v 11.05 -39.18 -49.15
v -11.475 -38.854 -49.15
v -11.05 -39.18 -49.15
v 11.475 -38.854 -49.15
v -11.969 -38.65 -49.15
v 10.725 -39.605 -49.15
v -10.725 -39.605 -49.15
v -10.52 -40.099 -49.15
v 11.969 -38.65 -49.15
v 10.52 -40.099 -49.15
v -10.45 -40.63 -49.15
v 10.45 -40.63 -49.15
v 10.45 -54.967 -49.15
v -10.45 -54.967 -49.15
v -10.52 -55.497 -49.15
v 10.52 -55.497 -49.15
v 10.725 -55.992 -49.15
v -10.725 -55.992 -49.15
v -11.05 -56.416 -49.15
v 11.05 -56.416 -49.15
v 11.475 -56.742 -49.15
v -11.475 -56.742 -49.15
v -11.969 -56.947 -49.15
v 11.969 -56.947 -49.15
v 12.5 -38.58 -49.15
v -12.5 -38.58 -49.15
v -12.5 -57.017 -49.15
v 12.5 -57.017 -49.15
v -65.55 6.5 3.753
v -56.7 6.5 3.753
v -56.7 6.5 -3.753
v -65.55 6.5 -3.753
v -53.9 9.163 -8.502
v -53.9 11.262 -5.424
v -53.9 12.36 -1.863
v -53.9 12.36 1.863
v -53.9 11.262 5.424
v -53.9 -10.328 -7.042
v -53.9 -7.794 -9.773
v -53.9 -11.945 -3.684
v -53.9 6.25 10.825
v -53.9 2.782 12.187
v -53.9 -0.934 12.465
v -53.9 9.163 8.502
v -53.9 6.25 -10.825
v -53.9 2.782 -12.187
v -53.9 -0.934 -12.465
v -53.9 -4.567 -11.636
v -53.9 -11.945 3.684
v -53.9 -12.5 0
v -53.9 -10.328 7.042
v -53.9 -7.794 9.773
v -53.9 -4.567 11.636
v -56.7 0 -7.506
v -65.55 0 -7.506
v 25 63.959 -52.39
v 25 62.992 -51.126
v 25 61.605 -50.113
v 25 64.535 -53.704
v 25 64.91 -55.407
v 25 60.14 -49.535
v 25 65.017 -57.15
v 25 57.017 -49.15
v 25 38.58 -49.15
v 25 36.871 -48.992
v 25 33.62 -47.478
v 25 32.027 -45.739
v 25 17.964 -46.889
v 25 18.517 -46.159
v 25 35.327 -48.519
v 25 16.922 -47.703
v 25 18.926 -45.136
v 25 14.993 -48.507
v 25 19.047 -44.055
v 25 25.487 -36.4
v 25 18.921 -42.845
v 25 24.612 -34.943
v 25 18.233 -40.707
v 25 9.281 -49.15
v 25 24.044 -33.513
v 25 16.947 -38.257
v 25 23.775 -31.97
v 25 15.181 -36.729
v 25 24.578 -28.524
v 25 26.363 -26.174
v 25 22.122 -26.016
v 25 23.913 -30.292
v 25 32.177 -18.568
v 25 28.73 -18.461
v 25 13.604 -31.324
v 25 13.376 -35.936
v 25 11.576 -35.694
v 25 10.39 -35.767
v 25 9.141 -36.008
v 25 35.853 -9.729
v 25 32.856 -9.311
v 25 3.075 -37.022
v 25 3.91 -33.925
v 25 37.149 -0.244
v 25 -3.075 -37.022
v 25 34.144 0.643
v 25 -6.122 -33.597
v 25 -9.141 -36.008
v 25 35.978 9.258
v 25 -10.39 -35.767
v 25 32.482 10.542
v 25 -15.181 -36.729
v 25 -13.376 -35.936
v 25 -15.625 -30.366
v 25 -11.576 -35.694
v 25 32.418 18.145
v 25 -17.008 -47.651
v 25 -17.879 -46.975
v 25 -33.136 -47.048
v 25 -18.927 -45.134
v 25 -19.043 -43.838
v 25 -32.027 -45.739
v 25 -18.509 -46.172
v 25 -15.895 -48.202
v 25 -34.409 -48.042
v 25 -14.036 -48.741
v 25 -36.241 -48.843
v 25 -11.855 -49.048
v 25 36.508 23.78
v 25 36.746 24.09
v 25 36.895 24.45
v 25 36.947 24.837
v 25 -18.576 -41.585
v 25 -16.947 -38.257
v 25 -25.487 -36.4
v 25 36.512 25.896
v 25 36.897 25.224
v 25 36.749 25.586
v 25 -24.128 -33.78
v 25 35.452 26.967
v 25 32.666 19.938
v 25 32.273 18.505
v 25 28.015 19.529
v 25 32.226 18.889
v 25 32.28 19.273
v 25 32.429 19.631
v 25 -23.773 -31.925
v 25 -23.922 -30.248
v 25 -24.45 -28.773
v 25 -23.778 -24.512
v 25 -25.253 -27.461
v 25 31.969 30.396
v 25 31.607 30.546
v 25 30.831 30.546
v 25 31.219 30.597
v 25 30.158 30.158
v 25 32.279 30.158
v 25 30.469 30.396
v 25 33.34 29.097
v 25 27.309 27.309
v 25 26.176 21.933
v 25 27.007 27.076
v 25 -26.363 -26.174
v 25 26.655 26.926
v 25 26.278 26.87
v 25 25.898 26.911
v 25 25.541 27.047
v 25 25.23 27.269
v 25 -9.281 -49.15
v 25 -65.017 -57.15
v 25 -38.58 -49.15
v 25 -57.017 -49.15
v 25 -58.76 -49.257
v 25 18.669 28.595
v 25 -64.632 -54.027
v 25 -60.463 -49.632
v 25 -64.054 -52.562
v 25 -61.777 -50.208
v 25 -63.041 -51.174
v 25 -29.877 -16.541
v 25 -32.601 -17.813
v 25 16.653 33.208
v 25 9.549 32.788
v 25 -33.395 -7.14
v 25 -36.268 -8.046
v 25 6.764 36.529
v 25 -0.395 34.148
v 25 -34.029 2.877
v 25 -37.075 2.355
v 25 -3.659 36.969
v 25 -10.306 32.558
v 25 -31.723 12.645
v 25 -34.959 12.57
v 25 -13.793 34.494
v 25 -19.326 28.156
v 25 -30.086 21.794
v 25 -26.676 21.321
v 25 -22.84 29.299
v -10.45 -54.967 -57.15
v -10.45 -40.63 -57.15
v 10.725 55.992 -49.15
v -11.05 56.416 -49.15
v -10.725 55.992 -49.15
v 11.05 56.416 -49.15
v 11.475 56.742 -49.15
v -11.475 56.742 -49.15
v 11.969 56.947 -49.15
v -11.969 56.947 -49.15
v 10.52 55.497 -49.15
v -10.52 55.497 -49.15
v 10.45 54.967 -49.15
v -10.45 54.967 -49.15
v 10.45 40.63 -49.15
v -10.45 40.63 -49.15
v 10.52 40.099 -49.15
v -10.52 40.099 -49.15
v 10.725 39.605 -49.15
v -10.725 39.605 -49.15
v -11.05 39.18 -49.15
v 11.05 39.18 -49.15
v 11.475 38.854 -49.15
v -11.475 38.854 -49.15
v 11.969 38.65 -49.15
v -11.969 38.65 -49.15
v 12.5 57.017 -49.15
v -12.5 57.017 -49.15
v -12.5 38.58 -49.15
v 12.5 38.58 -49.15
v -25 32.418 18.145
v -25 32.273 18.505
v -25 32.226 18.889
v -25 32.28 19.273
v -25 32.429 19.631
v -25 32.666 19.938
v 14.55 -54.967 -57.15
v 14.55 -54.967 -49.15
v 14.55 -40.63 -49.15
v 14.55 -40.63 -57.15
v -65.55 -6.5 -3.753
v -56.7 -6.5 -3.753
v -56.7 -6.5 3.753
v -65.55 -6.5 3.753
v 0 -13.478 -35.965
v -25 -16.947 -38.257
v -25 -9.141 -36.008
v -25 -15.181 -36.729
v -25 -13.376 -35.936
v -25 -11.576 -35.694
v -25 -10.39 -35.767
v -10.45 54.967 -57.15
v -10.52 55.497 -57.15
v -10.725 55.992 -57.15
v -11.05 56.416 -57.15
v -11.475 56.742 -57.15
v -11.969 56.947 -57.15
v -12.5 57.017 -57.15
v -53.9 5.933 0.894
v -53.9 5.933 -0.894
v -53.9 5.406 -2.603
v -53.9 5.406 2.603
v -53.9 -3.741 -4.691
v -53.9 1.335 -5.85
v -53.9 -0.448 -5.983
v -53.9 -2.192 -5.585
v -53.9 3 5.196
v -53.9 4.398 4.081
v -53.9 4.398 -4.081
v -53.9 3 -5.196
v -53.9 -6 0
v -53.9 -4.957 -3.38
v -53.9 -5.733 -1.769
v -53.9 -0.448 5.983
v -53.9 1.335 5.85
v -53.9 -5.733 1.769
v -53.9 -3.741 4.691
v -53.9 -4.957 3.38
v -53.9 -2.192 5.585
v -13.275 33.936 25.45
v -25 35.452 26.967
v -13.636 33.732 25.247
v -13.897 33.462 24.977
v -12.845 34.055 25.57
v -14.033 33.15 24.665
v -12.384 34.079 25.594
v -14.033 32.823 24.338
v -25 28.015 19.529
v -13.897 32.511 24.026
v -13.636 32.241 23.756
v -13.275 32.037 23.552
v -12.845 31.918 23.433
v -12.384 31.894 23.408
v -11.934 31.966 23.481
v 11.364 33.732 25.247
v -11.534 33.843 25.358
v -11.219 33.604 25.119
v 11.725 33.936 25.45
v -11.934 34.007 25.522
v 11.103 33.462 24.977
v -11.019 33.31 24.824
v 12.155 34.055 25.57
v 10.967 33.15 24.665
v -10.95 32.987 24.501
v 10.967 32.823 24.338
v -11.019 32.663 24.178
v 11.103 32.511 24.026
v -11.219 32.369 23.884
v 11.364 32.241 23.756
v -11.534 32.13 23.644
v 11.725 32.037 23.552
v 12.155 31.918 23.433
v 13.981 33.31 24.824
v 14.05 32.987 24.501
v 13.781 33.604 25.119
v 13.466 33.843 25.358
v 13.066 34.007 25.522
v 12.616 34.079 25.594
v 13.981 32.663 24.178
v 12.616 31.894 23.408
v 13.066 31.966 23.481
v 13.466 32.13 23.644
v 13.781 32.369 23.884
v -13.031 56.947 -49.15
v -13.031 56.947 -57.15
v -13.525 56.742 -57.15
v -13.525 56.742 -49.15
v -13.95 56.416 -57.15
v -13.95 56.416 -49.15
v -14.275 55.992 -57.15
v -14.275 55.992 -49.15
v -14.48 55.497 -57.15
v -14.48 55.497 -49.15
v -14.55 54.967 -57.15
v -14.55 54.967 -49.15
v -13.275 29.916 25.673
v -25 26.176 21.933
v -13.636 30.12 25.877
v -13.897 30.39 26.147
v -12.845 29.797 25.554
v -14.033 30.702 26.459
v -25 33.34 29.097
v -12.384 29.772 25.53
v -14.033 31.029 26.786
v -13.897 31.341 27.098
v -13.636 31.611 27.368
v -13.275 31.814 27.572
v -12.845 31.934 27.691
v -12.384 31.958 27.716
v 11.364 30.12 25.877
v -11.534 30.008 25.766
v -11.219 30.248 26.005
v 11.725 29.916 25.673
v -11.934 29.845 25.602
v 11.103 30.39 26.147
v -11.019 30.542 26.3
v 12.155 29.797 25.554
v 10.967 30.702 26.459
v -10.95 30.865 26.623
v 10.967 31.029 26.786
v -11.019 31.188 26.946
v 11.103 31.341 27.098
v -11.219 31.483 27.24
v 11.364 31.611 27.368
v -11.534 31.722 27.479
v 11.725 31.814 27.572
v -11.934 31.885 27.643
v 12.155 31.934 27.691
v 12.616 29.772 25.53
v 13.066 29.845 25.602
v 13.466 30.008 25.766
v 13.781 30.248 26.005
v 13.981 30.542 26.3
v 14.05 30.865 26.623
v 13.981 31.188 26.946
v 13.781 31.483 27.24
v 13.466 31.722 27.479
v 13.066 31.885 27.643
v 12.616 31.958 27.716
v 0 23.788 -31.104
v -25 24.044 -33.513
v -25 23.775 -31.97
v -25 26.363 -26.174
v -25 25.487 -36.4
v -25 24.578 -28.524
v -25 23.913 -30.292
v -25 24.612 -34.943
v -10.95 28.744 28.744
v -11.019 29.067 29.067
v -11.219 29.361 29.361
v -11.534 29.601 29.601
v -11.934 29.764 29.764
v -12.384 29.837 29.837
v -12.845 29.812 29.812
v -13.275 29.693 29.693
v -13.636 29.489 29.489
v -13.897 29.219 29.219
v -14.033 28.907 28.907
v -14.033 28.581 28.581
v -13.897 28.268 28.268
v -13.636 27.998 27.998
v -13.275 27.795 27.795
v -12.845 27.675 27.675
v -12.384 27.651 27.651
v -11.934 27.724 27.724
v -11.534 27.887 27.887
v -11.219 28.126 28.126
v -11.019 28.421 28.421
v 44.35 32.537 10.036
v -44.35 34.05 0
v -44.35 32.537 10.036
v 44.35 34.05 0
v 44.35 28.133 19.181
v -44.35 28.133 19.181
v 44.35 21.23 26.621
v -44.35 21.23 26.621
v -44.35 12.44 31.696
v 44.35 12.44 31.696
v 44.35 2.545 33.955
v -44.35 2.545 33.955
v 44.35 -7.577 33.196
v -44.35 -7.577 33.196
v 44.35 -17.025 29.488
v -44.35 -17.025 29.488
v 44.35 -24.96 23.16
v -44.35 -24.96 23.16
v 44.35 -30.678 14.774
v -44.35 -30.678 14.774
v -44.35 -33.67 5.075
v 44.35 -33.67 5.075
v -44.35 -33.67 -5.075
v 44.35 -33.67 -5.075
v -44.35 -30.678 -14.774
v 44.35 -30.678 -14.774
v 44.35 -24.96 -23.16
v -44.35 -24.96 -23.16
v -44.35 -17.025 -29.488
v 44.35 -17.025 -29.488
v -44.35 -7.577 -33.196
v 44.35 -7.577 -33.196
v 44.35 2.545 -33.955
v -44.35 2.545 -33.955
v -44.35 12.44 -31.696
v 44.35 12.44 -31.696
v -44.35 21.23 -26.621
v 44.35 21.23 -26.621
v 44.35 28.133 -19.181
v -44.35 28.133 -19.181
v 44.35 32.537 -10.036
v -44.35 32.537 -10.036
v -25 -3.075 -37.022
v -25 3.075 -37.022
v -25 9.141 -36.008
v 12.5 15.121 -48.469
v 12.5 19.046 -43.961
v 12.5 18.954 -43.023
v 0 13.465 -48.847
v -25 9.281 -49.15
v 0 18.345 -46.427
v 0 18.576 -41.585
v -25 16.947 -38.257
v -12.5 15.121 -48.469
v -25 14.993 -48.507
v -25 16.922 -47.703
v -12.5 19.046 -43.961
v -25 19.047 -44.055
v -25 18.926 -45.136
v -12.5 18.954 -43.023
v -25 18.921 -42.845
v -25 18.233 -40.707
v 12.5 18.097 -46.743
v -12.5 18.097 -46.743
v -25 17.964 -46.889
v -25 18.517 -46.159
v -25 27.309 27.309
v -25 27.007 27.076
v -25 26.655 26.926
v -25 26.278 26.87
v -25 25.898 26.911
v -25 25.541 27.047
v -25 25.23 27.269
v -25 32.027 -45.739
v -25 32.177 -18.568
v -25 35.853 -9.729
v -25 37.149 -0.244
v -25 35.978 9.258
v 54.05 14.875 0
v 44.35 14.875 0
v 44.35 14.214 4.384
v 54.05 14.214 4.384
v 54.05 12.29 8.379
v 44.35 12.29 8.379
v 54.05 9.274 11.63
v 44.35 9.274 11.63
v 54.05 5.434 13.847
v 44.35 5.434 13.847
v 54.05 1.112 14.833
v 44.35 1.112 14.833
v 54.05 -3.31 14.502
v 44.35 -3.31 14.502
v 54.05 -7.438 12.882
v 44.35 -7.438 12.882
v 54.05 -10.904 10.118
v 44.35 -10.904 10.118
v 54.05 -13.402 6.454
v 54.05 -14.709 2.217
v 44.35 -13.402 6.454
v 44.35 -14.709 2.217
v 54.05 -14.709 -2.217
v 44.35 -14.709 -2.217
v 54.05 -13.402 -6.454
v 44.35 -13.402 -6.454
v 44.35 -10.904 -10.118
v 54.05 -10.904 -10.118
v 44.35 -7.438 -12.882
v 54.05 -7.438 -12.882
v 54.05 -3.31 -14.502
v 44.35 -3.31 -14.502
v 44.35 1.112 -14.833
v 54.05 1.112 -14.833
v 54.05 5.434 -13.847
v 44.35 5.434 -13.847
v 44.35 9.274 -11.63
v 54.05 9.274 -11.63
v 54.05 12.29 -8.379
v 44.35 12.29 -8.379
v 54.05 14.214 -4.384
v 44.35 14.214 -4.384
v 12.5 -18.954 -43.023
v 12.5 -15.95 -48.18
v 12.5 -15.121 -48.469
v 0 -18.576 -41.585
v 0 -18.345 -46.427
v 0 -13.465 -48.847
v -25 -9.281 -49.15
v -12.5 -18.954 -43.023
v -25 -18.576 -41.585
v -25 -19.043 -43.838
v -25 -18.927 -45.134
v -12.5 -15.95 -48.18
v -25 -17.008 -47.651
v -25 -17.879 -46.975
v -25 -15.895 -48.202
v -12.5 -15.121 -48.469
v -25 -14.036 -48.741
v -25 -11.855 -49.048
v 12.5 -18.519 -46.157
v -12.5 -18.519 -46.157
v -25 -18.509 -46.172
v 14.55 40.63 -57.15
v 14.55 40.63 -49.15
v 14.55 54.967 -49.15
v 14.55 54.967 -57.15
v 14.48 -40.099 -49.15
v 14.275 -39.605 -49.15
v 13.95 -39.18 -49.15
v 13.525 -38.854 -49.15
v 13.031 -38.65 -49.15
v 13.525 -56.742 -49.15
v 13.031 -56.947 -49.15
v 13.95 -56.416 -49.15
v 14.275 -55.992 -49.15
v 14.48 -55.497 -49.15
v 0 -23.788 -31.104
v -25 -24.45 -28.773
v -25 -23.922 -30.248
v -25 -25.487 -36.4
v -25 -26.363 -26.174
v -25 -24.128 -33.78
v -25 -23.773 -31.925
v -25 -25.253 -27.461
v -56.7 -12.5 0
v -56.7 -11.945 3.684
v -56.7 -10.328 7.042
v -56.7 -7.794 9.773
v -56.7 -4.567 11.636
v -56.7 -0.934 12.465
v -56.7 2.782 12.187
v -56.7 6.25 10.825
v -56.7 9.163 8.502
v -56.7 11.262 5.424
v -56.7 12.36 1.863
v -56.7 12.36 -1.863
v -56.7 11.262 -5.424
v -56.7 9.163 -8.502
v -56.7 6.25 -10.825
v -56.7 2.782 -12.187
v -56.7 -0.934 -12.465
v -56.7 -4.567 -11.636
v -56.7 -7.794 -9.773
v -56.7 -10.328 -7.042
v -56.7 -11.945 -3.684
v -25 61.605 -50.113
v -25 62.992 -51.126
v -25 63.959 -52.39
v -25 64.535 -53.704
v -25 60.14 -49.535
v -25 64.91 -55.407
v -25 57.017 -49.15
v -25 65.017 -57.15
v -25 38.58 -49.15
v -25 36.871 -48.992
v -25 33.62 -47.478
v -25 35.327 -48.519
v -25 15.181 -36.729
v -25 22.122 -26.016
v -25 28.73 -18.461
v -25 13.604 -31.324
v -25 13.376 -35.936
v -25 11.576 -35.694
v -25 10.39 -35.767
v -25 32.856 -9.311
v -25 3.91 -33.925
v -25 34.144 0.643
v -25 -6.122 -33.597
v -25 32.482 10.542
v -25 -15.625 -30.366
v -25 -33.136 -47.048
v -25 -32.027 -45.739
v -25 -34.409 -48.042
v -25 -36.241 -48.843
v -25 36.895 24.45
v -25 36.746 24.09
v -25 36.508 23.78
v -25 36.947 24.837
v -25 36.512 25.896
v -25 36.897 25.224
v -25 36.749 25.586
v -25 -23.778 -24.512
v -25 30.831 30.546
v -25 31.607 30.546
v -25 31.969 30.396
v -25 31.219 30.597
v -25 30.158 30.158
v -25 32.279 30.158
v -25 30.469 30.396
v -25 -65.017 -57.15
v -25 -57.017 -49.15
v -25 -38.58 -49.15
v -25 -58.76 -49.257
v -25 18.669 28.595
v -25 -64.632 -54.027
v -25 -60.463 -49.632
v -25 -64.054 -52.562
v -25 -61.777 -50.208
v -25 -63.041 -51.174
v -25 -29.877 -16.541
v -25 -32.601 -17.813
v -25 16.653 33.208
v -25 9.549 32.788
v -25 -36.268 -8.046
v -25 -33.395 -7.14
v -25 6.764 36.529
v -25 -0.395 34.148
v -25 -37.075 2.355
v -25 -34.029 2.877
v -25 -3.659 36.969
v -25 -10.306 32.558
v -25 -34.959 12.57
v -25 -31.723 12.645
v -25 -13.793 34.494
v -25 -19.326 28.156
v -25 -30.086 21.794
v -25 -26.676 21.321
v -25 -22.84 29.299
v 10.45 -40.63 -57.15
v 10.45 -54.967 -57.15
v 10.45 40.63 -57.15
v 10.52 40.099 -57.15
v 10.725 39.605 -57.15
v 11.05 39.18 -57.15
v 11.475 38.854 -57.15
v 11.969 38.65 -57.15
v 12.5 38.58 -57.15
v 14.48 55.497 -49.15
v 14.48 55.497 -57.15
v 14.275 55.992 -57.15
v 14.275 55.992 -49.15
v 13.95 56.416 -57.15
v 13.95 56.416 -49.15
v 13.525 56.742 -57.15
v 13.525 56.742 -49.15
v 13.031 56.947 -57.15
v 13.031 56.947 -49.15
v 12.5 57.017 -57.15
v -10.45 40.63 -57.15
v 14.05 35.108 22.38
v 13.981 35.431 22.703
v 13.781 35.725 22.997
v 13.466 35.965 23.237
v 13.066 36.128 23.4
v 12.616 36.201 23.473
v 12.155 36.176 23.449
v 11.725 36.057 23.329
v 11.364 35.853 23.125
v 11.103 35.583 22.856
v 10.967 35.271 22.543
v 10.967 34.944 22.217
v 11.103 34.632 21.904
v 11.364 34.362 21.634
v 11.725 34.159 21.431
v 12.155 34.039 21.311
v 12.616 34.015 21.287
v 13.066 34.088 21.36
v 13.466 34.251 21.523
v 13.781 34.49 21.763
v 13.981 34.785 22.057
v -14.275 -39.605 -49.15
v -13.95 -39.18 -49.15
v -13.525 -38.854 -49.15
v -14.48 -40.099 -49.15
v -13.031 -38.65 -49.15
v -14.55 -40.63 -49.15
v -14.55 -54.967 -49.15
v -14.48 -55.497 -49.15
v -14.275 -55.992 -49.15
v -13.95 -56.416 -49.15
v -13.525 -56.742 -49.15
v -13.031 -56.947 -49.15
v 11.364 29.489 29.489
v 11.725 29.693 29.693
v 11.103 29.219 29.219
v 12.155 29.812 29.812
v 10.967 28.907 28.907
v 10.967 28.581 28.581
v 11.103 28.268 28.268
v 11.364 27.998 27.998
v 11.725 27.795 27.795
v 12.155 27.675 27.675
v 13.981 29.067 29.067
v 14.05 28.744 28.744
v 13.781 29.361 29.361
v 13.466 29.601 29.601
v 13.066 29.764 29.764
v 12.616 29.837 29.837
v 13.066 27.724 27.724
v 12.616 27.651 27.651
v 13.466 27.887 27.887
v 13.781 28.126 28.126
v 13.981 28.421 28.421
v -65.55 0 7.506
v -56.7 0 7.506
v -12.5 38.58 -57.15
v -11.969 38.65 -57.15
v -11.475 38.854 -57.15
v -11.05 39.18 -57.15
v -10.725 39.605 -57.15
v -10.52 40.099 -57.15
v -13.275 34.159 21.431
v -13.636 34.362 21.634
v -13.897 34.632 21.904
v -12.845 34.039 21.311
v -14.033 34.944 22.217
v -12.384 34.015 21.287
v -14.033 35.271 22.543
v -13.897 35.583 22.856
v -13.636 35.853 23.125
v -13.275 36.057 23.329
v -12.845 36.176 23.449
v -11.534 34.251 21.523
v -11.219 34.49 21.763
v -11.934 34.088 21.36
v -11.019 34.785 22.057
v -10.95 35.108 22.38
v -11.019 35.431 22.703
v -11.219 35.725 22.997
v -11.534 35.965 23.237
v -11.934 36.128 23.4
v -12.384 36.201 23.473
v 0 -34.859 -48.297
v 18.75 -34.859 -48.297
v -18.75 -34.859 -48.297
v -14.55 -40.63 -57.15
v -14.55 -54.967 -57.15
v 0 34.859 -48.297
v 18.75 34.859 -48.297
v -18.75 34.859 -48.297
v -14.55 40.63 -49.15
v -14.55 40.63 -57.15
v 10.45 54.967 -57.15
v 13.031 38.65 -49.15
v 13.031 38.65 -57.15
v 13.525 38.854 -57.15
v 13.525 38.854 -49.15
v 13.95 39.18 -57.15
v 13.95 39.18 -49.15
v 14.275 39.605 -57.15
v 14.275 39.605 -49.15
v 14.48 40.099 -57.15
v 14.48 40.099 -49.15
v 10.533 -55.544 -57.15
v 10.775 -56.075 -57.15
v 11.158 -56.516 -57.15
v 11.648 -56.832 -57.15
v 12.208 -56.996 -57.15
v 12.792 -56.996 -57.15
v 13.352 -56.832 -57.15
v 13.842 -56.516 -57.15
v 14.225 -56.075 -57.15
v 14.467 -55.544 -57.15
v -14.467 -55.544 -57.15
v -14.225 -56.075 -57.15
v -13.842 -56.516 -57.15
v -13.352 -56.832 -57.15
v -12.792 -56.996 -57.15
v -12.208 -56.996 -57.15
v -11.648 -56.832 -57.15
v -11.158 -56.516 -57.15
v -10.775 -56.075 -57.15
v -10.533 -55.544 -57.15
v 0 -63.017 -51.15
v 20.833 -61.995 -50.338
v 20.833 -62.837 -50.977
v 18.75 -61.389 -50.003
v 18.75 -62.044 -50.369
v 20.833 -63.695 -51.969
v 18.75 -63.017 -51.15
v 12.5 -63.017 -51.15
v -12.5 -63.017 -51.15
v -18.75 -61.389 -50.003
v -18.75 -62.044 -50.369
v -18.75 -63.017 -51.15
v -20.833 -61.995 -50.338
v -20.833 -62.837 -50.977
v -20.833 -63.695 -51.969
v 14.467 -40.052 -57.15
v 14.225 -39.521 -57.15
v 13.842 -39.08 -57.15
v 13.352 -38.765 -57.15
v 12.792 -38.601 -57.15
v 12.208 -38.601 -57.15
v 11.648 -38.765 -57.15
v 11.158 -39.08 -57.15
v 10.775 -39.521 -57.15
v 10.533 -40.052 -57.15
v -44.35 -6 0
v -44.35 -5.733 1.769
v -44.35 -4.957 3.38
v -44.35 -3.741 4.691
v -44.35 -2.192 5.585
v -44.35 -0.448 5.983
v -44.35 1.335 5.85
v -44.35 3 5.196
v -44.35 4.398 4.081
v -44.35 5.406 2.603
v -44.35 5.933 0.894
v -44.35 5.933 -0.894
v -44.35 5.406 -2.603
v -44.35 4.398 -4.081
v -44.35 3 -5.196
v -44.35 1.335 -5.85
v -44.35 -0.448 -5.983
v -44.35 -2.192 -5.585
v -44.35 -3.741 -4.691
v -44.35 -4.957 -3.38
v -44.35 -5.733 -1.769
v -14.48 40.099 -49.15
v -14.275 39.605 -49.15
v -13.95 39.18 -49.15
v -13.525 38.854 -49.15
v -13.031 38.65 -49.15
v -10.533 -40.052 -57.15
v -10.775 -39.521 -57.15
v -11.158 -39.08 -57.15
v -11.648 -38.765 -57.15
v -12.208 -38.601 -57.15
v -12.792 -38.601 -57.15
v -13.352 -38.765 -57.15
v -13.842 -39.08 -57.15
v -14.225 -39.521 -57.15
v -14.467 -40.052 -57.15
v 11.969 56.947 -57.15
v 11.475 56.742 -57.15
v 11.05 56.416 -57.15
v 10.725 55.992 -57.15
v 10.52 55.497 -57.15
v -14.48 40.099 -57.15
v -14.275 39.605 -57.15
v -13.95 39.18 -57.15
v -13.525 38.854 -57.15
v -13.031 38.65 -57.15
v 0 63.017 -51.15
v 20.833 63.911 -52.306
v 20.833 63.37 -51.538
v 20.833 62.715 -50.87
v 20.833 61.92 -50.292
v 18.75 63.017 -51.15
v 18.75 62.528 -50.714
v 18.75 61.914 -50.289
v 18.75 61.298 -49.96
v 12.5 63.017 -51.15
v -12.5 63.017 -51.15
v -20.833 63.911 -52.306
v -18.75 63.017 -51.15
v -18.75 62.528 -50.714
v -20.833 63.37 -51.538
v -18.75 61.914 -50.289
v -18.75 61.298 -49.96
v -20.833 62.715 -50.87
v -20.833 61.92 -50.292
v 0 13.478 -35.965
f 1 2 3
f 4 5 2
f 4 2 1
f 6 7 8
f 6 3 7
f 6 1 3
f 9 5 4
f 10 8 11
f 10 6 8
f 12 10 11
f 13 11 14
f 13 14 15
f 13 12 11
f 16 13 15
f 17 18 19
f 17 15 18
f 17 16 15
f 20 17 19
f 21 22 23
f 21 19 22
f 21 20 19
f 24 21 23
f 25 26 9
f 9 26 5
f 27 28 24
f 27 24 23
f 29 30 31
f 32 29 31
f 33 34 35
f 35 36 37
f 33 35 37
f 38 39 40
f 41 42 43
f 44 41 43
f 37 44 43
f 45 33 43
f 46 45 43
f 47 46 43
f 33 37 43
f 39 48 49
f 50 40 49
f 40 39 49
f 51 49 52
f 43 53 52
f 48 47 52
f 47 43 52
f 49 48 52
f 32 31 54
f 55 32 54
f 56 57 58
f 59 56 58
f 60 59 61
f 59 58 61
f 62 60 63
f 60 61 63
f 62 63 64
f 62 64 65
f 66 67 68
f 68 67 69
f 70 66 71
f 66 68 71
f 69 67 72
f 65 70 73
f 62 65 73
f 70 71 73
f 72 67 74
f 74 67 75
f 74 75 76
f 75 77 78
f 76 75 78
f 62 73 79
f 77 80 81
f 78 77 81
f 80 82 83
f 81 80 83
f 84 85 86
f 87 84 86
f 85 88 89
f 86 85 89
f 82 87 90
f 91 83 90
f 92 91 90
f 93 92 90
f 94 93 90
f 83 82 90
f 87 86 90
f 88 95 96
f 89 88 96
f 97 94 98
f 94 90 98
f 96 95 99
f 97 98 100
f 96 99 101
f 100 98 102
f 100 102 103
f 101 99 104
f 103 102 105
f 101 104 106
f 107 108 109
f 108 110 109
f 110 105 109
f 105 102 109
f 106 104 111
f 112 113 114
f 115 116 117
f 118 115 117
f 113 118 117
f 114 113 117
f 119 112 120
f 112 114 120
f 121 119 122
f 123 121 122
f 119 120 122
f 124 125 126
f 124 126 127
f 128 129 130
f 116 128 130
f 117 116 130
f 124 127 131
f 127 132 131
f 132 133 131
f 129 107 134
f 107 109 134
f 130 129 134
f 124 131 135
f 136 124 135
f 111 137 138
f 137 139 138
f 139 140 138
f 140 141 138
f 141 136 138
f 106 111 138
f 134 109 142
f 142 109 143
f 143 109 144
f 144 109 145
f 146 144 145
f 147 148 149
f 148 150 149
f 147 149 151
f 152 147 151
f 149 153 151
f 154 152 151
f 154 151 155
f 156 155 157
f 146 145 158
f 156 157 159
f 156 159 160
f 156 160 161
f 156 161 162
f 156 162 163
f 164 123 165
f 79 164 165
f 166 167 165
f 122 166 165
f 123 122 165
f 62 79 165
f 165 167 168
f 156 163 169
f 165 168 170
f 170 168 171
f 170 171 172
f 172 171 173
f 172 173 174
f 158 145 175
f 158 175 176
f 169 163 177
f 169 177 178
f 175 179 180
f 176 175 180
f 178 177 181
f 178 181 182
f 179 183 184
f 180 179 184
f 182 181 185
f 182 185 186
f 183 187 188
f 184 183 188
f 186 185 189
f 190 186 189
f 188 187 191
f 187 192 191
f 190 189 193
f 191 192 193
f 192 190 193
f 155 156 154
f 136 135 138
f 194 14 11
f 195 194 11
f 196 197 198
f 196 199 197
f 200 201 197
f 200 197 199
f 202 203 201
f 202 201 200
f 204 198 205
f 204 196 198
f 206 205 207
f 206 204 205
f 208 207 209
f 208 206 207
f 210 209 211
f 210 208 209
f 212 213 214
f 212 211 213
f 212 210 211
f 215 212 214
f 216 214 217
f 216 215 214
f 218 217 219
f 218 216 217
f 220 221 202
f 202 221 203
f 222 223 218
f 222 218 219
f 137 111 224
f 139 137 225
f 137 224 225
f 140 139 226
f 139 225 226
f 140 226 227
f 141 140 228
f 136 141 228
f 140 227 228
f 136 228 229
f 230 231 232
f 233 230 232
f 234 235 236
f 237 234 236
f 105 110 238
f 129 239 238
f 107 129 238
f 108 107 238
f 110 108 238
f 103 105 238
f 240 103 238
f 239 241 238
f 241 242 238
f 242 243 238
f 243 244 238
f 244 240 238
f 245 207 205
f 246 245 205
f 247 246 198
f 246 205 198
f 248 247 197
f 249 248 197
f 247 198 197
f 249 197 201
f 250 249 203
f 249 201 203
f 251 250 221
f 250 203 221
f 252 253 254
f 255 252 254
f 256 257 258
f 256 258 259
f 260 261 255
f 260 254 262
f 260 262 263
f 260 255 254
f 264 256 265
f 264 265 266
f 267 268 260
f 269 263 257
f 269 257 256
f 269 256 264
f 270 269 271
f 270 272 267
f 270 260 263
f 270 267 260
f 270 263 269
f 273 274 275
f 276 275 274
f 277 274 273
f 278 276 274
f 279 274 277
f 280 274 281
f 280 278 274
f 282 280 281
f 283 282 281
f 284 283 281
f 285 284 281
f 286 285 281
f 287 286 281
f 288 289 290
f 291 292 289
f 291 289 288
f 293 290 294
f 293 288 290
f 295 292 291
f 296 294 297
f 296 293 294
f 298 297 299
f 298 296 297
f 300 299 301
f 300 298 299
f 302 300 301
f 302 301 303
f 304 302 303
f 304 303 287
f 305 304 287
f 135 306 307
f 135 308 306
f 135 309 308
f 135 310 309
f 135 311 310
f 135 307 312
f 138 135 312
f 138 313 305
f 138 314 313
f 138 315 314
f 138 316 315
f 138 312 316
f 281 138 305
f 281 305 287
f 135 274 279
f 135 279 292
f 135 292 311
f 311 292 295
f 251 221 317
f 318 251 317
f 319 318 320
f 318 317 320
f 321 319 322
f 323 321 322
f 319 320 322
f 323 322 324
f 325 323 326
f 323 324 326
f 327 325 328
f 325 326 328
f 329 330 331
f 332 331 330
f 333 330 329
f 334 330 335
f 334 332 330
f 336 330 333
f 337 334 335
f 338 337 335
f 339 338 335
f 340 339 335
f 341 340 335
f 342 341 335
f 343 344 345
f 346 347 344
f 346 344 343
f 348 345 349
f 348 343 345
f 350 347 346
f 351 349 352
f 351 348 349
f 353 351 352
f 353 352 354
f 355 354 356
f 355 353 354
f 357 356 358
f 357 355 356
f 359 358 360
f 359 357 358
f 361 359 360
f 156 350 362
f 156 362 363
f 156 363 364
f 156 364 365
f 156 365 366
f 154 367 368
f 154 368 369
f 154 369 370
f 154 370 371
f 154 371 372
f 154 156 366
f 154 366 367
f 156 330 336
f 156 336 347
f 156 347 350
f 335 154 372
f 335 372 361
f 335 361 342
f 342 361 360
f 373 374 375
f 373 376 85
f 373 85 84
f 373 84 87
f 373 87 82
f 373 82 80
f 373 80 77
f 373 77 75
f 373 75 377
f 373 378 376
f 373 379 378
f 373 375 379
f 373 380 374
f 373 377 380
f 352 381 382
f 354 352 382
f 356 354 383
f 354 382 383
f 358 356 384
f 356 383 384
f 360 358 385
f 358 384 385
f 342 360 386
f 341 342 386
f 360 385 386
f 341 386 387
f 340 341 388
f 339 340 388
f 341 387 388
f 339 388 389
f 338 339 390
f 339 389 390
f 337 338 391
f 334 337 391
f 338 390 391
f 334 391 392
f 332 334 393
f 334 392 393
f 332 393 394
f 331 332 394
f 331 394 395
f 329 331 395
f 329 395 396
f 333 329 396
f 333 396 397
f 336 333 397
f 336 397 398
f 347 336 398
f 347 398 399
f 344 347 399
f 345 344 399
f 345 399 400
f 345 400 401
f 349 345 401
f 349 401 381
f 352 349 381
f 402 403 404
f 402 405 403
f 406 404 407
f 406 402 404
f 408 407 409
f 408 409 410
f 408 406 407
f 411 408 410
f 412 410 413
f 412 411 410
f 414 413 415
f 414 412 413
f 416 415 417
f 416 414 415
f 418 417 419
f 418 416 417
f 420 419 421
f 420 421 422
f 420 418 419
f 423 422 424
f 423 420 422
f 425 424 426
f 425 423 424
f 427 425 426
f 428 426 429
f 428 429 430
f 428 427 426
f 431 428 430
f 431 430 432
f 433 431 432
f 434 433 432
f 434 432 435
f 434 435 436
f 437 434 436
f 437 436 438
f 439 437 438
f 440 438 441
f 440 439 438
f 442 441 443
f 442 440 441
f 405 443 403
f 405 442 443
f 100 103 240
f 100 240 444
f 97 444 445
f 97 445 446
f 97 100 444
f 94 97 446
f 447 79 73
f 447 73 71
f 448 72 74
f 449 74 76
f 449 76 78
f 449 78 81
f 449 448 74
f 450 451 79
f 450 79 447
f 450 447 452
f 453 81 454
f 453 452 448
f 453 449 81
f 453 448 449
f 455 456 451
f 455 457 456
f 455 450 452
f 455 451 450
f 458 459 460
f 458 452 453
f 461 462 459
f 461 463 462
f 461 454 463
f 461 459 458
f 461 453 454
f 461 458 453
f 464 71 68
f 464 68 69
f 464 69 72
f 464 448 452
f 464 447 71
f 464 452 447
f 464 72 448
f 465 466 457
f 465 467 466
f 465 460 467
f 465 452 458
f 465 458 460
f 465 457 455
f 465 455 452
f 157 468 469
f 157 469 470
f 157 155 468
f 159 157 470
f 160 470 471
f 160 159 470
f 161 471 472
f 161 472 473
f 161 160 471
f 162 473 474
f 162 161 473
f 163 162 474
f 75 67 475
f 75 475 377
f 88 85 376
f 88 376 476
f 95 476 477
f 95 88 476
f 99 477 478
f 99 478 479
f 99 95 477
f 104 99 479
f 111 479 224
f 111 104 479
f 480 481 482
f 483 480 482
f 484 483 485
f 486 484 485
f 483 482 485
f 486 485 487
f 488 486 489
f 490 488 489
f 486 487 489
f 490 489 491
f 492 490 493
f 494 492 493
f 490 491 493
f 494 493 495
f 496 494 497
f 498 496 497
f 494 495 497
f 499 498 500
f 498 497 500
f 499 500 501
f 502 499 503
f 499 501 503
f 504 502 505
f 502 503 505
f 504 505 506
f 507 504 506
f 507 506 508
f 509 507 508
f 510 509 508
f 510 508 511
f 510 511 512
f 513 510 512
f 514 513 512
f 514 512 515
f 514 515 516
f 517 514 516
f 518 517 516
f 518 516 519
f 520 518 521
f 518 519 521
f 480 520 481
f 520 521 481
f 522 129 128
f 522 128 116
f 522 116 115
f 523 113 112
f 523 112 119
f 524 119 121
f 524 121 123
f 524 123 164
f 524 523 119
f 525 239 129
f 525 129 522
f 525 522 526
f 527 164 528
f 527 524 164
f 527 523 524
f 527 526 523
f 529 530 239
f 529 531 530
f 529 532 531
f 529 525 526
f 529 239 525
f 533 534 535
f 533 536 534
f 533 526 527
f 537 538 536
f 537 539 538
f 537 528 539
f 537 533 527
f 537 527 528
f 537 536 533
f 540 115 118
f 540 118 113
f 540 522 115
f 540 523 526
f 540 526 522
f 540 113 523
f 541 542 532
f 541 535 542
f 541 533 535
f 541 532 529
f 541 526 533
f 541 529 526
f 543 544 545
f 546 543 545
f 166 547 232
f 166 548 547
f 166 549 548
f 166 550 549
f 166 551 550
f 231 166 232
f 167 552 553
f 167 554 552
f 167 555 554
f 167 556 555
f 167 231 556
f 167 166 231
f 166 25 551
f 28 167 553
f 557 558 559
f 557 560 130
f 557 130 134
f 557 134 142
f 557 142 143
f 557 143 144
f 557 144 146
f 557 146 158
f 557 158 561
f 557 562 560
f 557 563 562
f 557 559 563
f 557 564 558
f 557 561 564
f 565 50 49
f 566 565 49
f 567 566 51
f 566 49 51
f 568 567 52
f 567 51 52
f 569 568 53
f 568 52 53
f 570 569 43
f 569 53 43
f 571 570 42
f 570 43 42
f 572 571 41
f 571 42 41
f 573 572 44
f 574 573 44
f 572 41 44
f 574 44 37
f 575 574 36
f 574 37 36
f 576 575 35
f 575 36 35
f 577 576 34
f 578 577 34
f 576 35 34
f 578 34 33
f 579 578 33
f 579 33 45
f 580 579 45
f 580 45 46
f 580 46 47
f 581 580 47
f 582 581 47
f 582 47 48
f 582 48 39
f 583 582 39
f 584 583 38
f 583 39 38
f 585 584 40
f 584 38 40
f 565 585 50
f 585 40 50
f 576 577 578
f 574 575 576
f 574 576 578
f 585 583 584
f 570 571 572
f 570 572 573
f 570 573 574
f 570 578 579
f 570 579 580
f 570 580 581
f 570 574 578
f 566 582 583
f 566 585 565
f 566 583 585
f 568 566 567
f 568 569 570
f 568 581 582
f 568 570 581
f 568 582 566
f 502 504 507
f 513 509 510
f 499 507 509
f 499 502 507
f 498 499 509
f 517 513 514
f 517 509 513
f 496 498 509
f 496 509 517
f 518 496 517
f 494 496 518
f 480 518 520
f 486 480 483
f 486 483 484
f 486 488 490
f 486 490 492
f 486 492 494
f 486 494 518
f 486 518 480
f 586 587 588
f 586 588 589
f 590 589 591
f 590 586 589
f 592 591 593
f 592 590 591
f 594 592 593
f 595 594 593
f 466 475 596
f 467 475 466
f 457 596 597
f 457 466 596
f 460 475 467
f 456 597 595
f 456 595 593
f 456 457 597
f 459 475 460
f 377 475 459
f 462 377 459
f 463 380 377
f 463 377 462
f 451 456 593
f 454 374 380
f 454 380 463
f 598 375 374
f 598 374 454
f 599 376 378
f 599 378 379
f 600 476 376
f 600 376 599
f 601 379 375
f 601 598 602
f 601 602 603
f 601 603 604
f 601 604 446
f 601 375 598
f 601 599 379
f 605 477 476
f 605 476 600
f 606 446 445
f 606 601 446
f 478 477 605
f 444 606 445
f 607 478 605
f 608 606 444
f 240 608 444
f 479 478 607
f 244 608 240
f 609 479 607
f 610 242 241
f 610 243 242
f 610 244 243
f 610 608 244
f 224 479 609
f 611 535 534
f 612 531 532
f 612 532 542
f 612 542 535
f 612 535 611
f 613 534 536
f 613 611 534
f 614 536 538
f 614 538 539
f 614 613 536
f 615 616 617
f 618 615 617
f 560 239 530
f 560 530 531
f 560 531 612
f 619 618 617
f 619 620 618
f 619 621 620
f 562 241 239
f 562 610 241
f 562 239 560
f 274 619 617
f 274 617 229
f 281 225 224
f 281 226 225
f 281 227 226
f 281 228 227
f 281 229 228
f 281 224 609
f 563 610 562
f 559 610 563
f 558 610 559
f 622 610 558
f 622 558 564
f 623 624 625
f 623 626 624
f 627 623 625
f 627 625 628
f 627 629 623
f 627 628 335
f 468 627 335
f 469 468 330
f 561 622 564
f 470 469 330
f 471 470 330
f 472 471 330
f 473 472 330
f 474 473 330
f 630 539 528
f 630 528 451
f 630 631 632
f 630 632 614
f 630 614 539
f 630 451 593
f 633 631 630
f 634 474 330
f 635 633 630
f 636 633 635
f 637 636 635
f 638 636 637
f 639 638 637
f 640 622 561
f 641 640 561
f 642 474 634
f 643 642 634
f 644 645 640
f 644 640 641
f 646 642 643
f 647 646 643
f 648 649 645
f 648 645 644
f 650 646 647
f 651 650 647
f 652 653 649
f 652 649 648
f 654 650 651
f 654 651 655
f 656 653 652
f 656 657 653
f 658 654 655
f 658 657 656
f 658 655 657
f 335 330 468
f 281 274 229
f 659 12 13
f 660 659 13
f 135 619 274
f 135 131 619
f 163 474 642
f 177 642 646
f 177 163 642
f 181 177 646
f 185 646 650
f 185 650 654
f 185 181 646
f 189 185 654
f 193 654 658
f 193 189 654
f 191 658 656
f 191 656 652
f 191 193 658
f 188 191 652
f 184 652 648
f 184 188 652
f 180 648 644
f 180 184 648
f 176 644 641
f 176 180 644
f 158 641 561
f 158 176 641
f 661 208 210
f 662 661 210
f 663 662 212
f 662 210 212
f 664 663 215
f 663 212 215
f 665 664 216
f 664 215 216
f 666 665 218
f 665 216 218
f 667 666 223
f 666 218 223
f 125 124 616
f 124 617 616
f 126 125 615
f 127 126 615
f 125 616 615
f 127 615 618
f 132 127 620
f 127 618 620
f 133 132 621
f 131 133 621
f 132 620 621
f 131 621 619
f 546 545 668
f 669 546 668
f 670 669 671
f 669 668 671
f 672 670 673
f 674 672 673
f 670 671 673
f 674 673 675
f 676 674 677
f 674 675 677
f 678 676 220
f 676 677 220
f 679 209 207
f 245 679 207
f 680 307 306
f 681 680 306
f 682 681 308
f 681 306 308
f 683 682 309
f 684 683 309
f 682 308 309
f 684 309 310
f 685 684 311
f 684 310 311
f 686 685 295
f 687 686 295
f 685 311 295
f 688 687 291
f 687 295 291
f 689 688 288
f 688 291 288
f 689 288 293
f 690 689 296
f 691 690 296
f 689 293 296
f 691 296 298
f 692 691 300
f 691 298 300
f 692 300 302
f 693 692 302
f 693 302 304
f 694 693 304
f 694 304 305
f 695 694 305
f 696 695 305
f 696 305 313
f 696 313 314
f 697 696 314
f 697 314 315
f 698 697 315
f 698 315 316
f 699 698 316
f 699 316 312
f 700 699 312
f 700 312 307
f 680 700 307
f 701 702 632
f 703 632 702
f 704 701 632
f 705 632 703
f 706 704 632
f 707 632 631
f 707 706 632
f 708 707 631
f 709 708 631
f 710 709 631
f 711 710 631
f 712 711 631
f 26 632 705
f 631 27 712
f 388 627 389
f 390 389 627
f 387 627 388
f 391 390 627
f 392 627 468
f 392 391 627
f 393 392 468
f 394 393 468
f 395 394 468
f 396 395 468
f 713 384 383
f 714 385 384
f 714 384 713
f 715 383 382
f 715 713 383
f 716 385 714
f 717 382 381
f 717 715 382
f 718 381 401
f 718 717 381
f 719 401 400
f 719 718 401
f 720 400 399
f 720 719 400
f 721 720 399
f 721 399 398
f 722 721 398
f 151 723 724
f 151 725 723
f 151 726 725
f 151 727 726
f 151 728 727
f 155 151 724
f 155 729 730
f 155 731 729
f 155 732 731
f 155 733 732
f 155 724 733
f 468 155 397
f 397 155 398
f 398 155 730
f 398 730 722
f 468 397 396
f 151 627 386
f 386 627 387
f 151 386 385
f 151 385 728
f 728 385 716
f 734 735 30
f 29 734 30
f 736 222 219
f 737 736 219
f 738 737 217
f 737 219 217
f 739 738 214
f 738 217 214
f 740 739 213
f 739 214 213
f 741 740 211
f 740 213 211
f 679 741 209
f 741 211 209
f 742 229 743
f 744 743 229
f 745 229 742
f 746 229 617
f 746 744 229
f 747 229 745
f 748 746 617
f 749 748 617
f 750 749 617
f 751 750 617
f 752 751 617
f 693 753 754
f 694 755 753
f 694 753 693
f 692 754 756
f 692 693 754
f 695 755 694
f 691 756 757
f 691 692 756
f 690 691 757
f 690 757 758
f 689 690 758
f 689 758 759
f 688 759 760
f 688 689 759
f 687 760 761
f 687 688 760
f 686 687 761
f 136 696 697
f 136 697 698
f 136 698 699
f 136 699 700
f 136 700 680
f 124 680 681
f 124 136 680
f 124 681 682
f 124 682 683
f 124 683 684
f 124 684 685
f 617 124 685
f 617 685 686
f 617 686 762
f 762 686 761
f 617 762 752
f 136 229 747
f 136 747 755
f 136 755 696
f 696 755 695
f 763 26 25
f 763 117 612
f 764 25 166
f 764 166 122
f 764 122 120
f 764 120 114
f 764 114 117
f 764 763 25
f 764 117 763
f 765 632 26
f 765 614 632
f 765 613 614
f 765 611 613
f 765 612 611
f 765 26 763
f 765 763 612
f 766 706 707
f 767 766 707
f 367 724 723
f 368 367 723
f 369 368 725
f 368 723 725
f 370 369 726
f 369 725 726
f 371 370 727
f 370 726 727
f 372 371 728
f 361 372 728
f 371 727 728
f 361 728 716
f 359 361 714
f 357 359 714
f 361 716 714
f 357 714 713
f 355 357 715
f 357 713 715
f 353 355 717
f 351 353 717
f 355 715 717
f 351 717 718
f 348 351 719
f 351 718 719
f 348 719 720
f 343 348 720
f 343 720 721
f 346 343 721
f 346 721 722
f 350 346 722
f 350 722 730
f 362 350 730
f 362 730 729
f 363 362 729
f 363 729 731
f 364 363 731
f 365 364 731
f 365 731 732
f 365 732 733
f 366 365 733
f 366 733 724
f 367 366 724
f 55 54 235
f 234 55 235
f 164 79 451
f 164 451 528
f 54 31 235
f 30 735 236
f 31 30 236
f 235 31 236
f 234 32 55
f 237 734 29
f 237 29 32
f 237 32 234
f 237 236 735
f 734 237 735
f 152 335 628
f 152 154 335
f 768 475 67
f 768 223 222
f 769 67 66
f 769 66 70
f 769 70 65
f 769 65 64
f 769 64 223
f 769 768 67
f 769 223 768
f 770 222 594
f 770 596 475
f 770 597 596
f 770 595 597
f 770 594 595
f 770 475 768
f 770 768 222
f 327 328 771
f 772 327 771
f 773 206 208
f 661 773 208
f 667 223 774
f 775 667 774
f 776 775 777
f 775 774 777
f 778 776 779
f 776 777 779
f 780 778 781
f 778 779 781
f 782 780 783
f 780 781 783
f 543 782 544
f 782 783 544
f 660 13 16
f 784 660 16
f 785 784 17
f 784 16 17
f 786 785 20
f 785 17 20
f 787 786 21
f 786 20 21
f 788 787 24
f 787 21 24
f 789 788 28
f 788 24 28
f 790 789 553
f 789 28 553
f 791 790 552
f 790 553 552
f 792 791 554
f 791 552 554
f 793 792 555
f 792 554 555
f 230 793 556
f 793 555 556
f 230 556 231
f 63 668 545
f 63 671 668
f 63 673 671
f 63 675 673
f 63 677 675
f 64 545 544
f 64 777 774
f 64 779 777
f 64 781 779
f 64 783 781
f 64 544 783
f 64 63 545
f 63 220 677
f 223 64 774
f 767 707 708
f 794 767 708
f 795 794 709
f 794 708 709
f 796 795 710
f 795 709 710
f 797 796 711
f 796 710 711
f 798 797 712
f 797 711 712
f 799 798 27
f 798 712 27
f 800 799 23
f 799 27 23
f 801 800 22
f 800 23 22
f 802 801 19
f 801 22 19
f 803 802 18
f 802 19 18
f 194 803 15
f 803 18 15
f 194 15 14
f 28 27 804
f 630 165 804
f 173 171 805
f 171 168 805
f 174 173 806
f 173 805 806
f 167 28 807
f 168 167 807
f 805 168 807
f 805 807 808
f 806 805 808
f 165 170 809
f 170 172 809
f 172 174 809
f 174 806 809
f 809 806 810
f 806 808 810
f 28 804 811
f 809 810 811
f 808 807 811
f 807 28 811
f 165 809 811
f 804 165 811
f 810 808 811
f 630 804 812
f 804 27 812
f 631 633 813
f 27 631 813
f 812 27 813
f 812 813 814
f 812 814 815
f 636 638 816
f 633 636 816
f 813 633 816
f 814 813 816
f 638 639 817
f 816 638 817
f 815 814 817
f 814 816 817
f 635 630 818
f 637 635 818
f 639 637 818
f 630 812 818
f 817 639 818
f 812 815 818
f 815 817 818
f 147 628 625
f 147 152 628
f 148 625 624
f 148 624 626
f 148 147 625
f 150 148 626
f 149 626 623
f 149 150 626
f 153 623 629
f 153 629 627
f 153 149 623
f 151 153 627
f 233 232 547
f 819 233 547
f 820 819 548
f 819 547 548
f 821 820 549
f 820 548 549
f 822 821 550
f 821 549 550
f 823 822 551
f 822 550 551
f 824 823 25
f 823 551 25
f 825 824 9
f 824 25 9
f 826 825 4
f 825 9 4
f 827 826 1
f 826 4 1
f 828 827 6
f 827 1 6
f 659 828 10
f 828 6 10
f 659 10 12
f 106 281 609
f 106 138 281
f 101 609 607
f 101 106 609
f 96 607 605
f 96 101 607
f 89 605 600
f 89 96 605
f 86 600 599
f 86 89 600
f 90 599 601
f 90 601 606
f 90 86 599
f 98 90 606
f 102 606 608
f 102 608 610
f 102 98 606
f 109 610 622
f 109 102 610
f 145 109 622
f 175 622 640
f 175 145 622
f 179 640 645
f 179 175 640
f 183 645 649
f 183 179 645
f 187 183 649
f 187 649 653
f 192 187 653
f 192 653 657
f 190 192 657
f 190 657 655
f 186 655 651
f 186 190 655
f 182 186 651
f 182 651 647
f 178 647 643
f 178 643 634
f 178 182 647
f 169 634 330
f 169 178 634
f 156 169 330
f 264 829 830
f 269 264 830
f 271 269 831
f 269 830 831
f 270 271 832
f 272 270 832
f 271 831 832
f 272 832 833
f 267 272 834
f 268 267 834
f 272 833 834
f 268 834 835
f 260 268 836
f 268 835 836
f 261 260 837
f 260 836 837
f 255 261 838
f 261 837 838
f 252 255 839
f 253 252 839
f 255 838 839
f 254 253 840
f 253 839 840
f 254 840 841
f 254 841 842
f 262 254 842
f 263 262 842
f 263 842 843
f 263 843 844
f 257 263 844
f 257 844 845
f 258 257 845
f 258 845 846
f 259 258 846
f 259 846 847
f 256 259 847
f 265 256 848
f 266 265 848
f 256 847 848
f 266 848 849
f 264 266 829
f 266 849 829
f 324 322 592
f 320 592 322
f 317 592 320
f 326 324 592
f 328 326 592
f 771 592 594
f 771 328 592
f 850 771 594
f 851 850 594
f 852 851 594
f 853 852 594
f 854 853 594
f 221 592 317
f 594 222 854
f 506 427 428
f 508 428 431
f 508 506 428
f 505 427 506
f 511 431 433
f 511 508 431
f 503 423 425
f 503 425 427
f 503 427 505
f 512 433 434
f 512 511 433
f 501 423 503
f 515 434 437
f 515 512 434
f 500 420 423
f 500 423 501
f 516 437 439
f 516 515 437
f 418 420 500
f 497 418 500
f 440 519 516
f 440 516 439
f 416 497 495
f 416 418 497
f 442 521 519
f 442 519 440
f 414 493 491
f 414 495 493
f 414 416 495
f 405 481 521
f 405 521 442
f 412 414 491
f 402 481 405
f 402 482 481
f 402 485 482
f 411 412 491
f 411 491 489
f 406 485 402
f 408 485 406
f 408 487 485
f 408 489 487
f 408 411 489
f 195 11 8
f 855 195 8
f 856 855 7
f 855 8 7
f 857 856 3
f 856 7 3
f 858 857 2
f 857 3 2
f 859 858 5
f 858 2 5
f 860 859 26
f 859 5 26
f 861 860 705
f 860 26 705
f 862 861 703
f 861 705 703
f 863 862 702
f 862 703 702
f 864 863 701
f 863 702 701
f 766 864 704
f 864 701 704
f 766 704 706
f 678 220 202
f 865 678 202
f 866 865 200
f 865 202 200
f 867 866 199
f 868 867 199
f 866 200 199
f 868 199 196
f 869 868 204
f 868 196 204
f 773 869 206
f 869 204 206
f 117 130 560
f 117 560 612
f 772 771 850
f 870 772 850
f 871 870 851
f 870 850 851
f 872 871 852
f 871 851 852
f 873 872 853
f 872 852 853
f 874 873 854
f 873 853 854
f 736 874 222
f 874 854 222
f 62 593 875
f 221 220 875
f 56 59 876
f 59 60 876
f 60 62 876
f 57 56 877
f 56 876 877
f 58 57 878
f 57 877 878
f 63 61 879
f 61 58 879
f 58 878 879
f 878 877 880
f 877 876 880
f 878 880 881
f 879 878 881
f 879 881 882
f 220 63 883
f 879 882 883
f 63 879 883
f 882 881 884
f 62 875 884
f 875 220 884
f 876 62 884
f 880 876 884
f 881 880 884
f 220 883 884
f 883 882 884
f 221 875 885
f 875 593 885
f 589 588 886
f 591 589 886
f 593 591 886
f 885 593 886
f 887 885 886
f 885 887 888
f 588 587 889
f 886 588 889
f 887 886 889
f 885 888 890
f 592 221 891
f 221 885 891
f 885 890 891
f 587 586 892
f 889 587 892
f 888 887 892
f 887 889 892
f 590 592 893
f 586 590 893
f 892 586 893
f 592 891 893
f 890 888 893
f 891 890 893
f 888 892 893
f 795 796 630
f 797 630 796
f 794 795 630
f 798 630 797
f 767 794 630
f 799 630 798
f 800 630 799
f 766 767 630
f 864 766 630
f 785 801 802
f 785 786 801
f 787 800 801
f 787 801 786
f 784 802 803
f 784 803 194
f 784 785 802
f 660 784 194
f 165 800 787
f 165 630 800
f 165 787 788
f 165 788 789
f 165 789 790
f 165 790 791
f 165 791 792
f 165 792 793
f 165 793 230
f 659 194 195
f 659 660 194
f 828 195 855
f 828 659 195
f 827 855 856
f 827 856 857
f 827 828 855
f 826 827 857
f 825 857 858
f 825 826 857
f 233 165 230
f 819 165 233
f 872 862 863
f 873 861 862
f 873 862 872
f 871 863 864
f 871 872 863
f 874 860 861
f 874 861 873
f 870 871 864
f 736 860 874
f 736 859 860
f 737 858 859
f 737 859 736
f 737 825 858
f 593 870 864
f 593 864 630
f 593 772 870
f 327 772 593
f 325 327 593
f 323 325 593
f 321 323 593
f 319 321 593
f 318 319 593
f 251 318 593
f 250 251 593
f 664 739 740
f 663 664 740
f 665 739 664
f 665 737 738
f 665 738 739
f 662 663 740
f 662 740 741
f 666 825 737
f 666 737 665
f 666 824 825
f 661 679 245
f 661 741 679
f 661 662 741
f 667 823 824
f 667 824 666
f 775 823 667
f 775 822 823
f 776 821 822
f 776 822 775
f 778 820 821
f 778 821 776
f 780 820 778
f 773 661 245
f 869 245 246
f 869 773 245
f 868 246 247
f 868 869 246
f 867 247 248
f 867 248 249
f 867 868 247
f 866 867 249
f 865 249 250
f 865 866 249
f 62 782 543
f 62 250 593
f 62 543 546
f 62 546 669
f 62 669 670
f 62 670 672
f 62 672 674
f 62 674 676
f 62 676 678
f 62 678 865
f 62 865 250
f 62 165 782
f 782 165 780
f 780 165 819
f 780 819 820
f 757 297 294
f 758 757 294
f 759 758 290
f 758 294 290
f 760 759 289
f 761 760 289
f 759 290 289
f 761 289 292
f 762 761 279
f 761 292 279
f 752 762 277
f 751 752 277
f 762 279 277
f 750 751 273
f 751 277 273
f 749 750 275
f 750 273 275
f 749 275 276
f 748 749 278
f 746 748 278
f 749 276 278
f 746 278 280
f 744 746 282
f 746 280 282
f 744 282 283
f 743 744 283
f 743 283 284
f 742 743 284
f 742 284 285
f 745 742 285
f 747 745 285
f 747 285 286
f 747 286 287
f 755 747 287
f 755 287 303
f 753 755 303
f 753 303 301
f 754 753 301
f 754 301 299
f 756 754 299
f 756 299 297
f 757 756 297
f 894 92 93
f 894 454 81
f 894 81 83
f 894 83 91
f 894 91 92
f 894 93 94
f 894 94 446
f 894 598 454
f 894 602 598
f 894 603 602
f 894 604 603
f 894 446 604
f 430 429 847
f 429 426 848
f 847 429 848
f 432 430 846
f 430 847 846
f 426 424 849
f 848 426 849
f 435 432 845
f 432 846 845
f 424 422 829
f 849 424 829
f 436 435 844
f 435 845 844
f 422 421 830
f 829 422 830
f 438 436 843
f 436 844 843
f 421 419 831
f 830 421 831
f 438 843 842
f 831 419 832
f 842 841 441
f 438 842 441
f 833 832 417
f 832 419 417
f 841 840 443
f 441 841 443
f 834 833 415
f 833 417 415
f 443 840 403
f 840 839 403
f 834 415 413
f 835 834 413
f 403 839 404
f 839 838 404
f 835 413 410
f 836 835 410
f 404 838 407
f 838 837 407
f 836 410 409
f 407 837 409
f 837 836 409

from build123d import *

# Parameters (mm, degrees)
F0_R         = 34.05
F1_DEPTH     = 44.35
F2_R         = 14.875
F3_DEPTH     = 9.7
F4_R         = 6
F5_DEPTH     = 9.55
F6_R         = 12.5
F7_DEPTH     = 2.8
F9_DEPTH     = 8.85
F10_DEPTH    = 25
F11_T1_DEPTH = 50
F11_T3_DEPTH = 90
F13_DEPTH    = 8.0010001
F14_R        = 1.55
F15_DEPTH    = 86.3860158555
F16_R        = 1.5


# Not quite as in the source:
# - a fillet or chamfer that OpenCascade refuses, or shapes differently, is made with other operations: its cross-section is extruded or revolved along the edge and cut away or added


with BuildPart() as f1:
    # F0 (on Right) → F1 (new body, symmetric)
    with BuildSketch(Plane.YZ):
        Circle(F0_R)
    extrude(amount=F1_DEPTH, both=True)

    # F2 (on face) → F3 (join)
    with BuildSketch(Plane.YZ.offset(44.35)):
        Circle(F2_R)
    extrude(amount=F3_DEPTH)

    # F4 (on face) → F5 (join)
    with BuildSketch(Plane(origin=(-44.35, 0, 0), x_dir=(0, -1, 0), z_dir=(-1, 0, 0))):
        Circle(F4_R)
    extrude(amount=F5_DEPTH)


with BuildPart() as f7:
    # F6 (on face) → F7 (new body)
    with BuildSketch(Plane(origin=(-53.9, 0, 0), x_dir=(0, -1, 0), z_dir=(-1, 0, 0))):
        Circle(F6_R)
    extrude(amount=F7_DEPTH)


with BuildPart() as f9:
    # F8 (on face) → F9 (new body)
    with BuildSketch(Plane(origin=(-56.7, 0, 0), x_dir=(0, -1, 0), z_dir=(-1, 0, 0))):
        Polygon((6.5, 3.7527767497), (0, 7.5055534995), (-6.5, 3.7527767497), (-6.5, -3.7527767497), (0, -7.5055534995), (6.5, -3.7527767497), align=None)
    extrude(amount=F9_DEPTH)


with BuildPart() as f10:
    # F0 (on Right) → F10 (new body, symmetric)
    with BuildSketch(Plane.YZ):
        with BuildLine():
            ThreePointArc((28.0146918209, 19.5294531972), (-27.1218147701, -20.7516183363), (26.1756598689, 21.9330191818))
            Line((26.1756598689, 21.9330191818), (33.3400847329, 29.0974440458))
            Line((33.3400847329, 29.0974440458), (31.2187643894, 31.2187643894))
            Line((31.2187643894, 31.2187643894), (26.2690169211, 26.2690169211))
            ThreePointArc((26.2690169211, 26.2690169211), (-28.4585510619, 23.8795596999), (-21.3083646104, -30.4314984453))
            Line((-21.3083646104, -30.4314984453), (-34.415200503, -49.15))
            Line((-34.415200503, -49.15), (-65.0168608087, -49.15))
            Line((-65.0168608087, -49.15), (-65.0168608087, -57.15))
            Line((-65.0168608087, -57.15), (-40.0168608087, -57.15))
            Line((-40.0168608087, -57.15), (40.0168608087, -57.15))
            Line((40.0168608087, -57.15), (65.0168608087, -57.15))
            Line((65.0168608087, -57.15), (65.0168608087, -49.15))
            Line((65.0168608087, -49.15), (34.415200503, -49.15))
            Line((34.415200503, -49.15), (21.3083646104, -30.4314984453))
            ThreePointArc((21.3083646104, -30.4314984453), (36.3368391247, -7.7302407742), (31.8504204749, 19.1225839147))
            Line((31.8504204749, 19.1225839147), (37.5636367015, 24.8358001413))
            Line((37.5636367015, 24.8358001413), (35.4518607172, 26.9666220935))
            Line((35.4518607172, 26.9666220935), (28.0146918209, 19.5294531972))
        make_face()
        with BuildLine():
            Line((14.2552205634, -34.3061391982), (24.6490037929, -49.15))
            Line((24.6490037929, -49.15), (-24.6490037929, -49.15))
            Line((-24.6490037929, -49.15), (-14.2552205634, -34.3061391982))
            ThreePointArc((-14.2552205634, -34.3061391982), (0, -37.15), (14.2552205634, -34.3061391982))
        make_face(mode=Mode.SUBTRACT)
    extrude(amount=F10_DEPTH, both=True)

    # F11: fillet of radius 8 on 10 edges, made by hand

    # F11_s2 → F11_t1 (join)
    with BuildSketch(Plane.YZ.offset(-25)):
        with BuildLine():
            add(Edge.make_bspline(
                [(32.0265205531, -45.7386114908), (34.415200503, -49.15), (38.5797369074, -49.15)],
                knots=[0, 0, 0, 1, 1, 1], degree=2, weights=[1, 1, 1]))
            Line((38.5797369074, -49.15), (34.415200503, -49.15))
            Line((34.415200503, -49.15), (32.0265205531, -45.7386114908))
        make_face()
        with BuildLine():
            add(Edge.make_bspline(
                [(-38.5797369074, -49.15), (-34.415200503, -49.15), (-32.0265205531, -45.7386114908)],
                knots=[0, 0, 0, 1, 1, 1], degree=2, weights=[1, 1, 1]))
            Line((-32.0265205531, -45.7386114908), (-34.415200503, -49.15))
            Line((-34.415200503, -49.15), (-38.5797369074, -49.15))
        make_face()
        with BuildLine():
            add(Edge.make_bspline(
                [(-25.4872127895, -36.3995121427), (-21.650943696, -30.9207520836), (-26.363276693, -26.1744177014)],
                knots=[0, 0, 0, 1, 1, 1], degree=2, weights=[1, 1, 1]))
            ThreePointArc((-26.363276693, -26.1744177014), (-23.930671329, -28.4155849798), (-21.3083646104, -30.4314984453))
            Line((-21.3083646104, -30.4314984453), (-25.4872127895, -36.3995121427))
        make_face()
        with BuildLine():
            add(Edge.make_bspline(
                [(-15.8343631315, -36.5613885092), (-24.6490037929, -49.15), (-9.2811467771, -49.15)],
                knots=[0, 0, 0, 1, 1, 1], degree=2, weights=[1, 1, 1]))
            Line((-9.2811467771, -49.15), (-24.6490037929, -49.15))
            Line((-24.6490037929, -49.15), (-15.8343631315, -36.5613885092))
        make_face()
        with BuildLine():
            add(Edge.make_bspline(
                [(9.2811467771, -49.15), (24.6490037929, -49.15), (15.8343631315, -36.5613885092)],
                knots=[0, 0, 0, 1, 1, 1], degree=2, weights=[1, 1, 1]))
            Line((15.8343631315, -36.5613885092), (24.6490037929, -49.15))
            Line((24.6490037929, -49.15), (9.2811467771, -49.15))
        make_face()
        with BuildLine():
            add(Edge.make_bspline(
                [(17.6631407114, -39.1731535648), (14.4950155025, -34.6486018625), (9.1413884799, -36.0077424544)],
                knots=[0, 0, 0, 1, 1, 1], degree=2, weights=[1, 1, 1]))
            ThreePointArc((9.1413884799, -36.0077424544), (11.7292025343, -35.2497986932), (14.2552205634, -34.3061391982))
            Line((14.2552205634, -34.3061391982), (17.6631407114, -39.1731535648))
        make_face()
        with BuildLine():
            add(Edge.make_bspline(
                [(26.363276693, -26.1744177014), (21.650943696, -30.9207520836), (25.4872127895, -36.3995121427)],
                knots=[0, 0, 0, 1, 1, 1], degree=2, weights=[1, 1, 1]))
            Line((25.4872127895, -36.3995121427), (21.3083646104, -30.4314984453))
            ThreePointArc((21.3083646104, -30.4314984453), (23.930671329, -28.4155849798), (26.363276693, -26.1744177014))
        make_face()
        with BuildLine():
            add(Edge.make_bspline(
                [(-17.6631407114, -39.1731535648), (-14.4950155025, -34.6486018625), (-9.1413884799, -36.0077424544)],
                knots=[0, 0, 0, 1, 1, 1], degree=2, weights=[1, 1, 1]))
            ThreePointArc((-9.1413884799, -36.0077424544), (-11.7292025343, -35.2497986932), (-14.2552205634, -34.3061391982))
            Line((-14.2552205634, -34.3061391982), (-17.6631407114, -39.1731535648))
        make_face()
    extrude(amount=F11_T1_DEPTH)

    # F11_s4 → F11_t3 (cut)
    with BuildSketch(Plane.YZ.offset(-45)):
        with BuildLine():
            add(Edge.make_bspline(
                [(-57.0168608087, -49.15), (-65.0168608087, -49.15), (-65.0168608087, -57.15)],
                knots=[0, 0, 0, 1, 1, 1], degree=2, weights=[1, 1, 1]))
            Line((-65.0168608087, -57.15), (-65.0168608087, -49.15))
            Line((-65.0168608087, -49.15), (-57.0168608087, -49.15))
        make_face()
        with BuildLine():
            add(Edge.make_bspline(
                [(65.0168608087, -57.15), (65.0168608087, -49.15), (57.0168608087, -49.15)],
                knots=[0, 0, 0, 1, 1, 1], degree=2, weights=[1, 1, 1]))
            Line((57.0168608087, -49.15), (65.0168608087, -49.15))
            Line((65.0168608087, -49.15), (65.0168608087, -57.15))
        make_face()
    extrude(amount=F11_T3_DEPTH, mode=Mode.SUBTRACT)

    # F12 (on face) → F13 (cut, through all)
    with BuildSketch(Plane.XY.offset(-49.15)):
        with BuildLine():
            ThreePointArc((-10.45, 54.9668608087), (-11.0504310986, 56.4164297101), (-12.5, 57.0168608087))
            ThreePointArc((-12.5, 57.0168608087), (-13.9495689014, 56.4164297101), (-14.55, 54.9668608087))
            Line((-14.55, 54.9668608087), (-14.55, 40.6297369074))
            ThreePointArc((-14.55, 40.6297369074), (-13.9495689014, 39.180168006), (-12.5, 38.5797369074))
            ThreePointArc((-12.5, 38.5797369074), (-11.0504310986, 39.180168006), (-10.45, 40.6297369074))
            Line((-10.45, 40.6297369074), (-10.45, 54.9668608087))
        make_face()
        with BuildLine():
            ThreePointArc((14.55, 54.9668608087), (13.9495689014, 56.4164297101), (12.5, 57.0168608087))
            ThreePointArc((12.5, 57.0168608087), (11.0504310986, 56.4164297101), (10.45, 54.9668608087))
            Line((10.45, 54.9668608087), (10.45, 40.6297369074))
            ThreePointArc((10.45, 40.6297369074), (11.0504310986, 39.180168006), (12.5, 38.5797369074))
            ThreePointArc((12.5, 38.5797369074), (13.9495689014, 39.180168006), (14.55, 40.6297369074))
            Line((14.55, 40.6297369074), (14.55, 54.9668608087))
        make_face()
        with BuildLine():
            Line((14.55, -54.9668608087), (14.55, -40.6297369074))
            ThreePointArc((14.55, -40.6297369074), (12.5, -38.5797369074), (10.45, -40.6297369074))
            Line((10.45, -40.6297369074), (10.45, -54.9668608087))
            ThreePointArc((10.45, -54.9668608087), (12.5, -57.0168608087), (14.55, -54.9668608087))
        make_face()
        with BuildLine():
            Line((-10.45, -54.9668608087), (-10.45, -40.6297369074))
            ThreePointArc((-10.45, -40.6297369074), (-12.5, -38.5797369074), (-14.55, -40.6297369074))
            Line((-14.55, -40.6297369074), (-14.55, -54.9668608087))
            ThreePointArc((-14.55, -54.9668608087), (-12.5, -57.0168608087), (-10.45, -54.9668608087))
        make_face()
    extrude(amount=-F13_DEPTH, mode=Mode.SUBTRACT)

    # F14 (on face) → F15 (cut, through all)
    with BuildSketch(Plane(origin=(0, 0, 0), x_dir=(1, 0, 0), z_dir=(0, -0.7071067812, 0.7071067812))):
        with Locations((-12.5, 40.65)):
            Circle(F14_R)
        with Locations((12.5, 40.65)):
            Circle(F14_R)
    extrude(amount=-F15_DEPTH, mode=Mode.SUBTRACT)

    # F16
    f16_edges = [f10.edges().sort_by_distance(p)[0] for p in [
        (0, 31.218764, 31.218764),
        (0, 37.563637, 24.8358),
        (0, 31.85042, 19.122584),
        (0, 26.269017, 26.269017),
    ]]
    fillet(f16_edges, radius=F16_R)


solid = Compound([f1.part, f7.part, f9.part, f10.part])
